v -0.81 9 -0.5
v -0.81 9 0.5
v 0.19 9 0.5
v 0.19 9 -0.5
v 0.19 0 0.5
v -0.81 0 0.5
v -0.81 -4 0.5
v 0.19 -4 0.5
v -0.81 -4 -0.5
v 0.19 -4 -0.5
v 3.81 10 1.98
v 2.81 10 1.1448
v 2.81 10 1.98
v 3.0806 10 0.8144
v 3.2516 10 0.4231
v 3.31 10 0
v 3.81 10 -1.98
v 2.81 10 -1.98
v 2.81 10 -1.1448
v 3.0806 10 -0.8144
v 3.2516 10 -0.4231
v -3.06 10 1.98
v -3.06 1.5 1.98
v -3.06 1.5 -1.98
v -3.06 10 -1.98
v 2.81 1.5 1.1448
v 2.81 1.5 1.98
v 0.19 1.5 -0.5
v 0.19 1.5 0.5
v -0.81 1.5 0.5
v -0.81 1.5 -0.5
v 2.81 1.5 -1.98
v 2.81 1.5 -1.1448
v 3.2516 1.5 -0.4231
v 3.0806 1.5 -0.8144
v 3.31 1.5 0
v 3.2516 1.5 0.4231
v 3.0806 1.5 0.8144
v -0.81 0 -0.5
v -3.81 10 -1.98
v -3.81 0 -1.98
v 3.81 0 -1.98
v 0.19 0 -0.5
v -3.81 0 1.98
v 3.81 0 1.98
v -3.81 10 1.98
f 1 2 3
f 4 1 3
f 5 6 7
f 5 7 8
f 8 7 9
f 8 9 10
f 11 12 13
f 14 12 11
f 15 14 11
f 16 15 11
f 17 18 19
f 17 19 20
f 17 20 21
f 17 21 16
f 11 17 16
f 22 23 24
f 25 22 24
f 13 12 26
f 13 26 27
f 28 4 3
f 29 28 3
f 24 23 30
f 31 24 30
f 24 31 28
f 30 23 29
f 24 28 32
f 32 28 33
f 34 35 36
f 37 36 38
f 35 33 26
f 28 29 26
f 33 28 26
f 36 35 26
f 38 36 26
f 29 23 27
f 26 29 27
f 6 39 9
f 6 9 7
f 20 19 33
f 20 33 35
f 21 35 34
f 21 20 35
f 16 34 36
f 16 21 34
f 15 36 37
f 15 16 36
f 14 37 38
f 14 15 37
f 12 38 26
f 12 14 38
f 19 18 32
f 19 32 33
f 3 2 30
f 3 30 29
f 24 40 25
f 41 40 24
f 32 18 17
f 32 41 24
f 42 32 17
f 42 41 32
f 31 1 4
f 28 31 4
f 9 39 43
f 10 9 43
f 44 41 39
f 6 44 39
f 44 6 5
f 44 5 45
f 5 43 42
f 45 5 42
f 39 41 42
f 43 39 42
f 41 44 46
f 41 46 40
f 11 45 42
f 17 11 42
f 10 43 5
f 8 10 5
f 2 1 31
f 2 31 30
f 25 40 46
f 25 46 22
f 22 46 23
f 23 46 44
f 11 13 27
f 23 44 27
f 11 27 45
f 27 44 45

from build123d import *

# Parameters (mm, degrees)
SKETCH_1_W           = 7.62
SKETCH_1_H           = 3.96
EXTRUDE_1_DEPTH      = 10
CUT_EXTRUDE_1_DEPTH  = 8.5
EXTRUDE_2_DEPTH      = 4
EXTRUDE_2_DEPTH_BACK = 9
SKETCH_3_W           = 1
SKETCH_3_H           = 1


with BuildPart() as part:
    # 草图1 → 拉伸1 (new body)
    with BuildSketch(Plane(origin=(0, 0, 0), x_dir=(1, 0, 0), z_dir=(0, 1, 0))):
        Rectangle(SKETCH_1_W, SKETCH_1_H)
    extrude(amount=EXTRUDE_1_DEPTH)

    # 草图2 → 切除-拉伸1 (cut)
    with BuildSketch(Plane(origin=(0, 10, 0), x_dir=(-1, 0, 0), z_dir=(0, 1, 0))):
        with BuildLine():
            Line((-2.81, 1.144818304), (-2.81, 1.98))
            Line((-2.81, 1.98), (3.06, 1.98))
            Line((3.06, 1.98), (3.06, -1.98))
            Line((3.06, -1.98), (-2.81, -1.98))
            Line((-2.81, -1.98), (-2.81, -1.144818304))
            ThreePointArc((-2.81, -1.144818304), (-3.31, 0), (-2.81, 1.144818304))
        make_face()
    extrude(amount=-CUT_EXTRUDE_1_DEPTH, mode=Mode.SUBTRACT)

    # 草图3 → 拉伸2 (add, two sides: drawn at the far end of the back side and taken through both)
    with BuildSketch(Plane.XZ.offset(-EXTRUDE_2_DEPTH_BACK)):
        with Locations((-0.31, 0)):
            Rectangle(SKETCH_3_W, SKETCH_3_H)
    extrude(amount=EXTRUDE_2_DEPTH + EXTRUDE_2_DEPTH_BACK)


solid = part.part
